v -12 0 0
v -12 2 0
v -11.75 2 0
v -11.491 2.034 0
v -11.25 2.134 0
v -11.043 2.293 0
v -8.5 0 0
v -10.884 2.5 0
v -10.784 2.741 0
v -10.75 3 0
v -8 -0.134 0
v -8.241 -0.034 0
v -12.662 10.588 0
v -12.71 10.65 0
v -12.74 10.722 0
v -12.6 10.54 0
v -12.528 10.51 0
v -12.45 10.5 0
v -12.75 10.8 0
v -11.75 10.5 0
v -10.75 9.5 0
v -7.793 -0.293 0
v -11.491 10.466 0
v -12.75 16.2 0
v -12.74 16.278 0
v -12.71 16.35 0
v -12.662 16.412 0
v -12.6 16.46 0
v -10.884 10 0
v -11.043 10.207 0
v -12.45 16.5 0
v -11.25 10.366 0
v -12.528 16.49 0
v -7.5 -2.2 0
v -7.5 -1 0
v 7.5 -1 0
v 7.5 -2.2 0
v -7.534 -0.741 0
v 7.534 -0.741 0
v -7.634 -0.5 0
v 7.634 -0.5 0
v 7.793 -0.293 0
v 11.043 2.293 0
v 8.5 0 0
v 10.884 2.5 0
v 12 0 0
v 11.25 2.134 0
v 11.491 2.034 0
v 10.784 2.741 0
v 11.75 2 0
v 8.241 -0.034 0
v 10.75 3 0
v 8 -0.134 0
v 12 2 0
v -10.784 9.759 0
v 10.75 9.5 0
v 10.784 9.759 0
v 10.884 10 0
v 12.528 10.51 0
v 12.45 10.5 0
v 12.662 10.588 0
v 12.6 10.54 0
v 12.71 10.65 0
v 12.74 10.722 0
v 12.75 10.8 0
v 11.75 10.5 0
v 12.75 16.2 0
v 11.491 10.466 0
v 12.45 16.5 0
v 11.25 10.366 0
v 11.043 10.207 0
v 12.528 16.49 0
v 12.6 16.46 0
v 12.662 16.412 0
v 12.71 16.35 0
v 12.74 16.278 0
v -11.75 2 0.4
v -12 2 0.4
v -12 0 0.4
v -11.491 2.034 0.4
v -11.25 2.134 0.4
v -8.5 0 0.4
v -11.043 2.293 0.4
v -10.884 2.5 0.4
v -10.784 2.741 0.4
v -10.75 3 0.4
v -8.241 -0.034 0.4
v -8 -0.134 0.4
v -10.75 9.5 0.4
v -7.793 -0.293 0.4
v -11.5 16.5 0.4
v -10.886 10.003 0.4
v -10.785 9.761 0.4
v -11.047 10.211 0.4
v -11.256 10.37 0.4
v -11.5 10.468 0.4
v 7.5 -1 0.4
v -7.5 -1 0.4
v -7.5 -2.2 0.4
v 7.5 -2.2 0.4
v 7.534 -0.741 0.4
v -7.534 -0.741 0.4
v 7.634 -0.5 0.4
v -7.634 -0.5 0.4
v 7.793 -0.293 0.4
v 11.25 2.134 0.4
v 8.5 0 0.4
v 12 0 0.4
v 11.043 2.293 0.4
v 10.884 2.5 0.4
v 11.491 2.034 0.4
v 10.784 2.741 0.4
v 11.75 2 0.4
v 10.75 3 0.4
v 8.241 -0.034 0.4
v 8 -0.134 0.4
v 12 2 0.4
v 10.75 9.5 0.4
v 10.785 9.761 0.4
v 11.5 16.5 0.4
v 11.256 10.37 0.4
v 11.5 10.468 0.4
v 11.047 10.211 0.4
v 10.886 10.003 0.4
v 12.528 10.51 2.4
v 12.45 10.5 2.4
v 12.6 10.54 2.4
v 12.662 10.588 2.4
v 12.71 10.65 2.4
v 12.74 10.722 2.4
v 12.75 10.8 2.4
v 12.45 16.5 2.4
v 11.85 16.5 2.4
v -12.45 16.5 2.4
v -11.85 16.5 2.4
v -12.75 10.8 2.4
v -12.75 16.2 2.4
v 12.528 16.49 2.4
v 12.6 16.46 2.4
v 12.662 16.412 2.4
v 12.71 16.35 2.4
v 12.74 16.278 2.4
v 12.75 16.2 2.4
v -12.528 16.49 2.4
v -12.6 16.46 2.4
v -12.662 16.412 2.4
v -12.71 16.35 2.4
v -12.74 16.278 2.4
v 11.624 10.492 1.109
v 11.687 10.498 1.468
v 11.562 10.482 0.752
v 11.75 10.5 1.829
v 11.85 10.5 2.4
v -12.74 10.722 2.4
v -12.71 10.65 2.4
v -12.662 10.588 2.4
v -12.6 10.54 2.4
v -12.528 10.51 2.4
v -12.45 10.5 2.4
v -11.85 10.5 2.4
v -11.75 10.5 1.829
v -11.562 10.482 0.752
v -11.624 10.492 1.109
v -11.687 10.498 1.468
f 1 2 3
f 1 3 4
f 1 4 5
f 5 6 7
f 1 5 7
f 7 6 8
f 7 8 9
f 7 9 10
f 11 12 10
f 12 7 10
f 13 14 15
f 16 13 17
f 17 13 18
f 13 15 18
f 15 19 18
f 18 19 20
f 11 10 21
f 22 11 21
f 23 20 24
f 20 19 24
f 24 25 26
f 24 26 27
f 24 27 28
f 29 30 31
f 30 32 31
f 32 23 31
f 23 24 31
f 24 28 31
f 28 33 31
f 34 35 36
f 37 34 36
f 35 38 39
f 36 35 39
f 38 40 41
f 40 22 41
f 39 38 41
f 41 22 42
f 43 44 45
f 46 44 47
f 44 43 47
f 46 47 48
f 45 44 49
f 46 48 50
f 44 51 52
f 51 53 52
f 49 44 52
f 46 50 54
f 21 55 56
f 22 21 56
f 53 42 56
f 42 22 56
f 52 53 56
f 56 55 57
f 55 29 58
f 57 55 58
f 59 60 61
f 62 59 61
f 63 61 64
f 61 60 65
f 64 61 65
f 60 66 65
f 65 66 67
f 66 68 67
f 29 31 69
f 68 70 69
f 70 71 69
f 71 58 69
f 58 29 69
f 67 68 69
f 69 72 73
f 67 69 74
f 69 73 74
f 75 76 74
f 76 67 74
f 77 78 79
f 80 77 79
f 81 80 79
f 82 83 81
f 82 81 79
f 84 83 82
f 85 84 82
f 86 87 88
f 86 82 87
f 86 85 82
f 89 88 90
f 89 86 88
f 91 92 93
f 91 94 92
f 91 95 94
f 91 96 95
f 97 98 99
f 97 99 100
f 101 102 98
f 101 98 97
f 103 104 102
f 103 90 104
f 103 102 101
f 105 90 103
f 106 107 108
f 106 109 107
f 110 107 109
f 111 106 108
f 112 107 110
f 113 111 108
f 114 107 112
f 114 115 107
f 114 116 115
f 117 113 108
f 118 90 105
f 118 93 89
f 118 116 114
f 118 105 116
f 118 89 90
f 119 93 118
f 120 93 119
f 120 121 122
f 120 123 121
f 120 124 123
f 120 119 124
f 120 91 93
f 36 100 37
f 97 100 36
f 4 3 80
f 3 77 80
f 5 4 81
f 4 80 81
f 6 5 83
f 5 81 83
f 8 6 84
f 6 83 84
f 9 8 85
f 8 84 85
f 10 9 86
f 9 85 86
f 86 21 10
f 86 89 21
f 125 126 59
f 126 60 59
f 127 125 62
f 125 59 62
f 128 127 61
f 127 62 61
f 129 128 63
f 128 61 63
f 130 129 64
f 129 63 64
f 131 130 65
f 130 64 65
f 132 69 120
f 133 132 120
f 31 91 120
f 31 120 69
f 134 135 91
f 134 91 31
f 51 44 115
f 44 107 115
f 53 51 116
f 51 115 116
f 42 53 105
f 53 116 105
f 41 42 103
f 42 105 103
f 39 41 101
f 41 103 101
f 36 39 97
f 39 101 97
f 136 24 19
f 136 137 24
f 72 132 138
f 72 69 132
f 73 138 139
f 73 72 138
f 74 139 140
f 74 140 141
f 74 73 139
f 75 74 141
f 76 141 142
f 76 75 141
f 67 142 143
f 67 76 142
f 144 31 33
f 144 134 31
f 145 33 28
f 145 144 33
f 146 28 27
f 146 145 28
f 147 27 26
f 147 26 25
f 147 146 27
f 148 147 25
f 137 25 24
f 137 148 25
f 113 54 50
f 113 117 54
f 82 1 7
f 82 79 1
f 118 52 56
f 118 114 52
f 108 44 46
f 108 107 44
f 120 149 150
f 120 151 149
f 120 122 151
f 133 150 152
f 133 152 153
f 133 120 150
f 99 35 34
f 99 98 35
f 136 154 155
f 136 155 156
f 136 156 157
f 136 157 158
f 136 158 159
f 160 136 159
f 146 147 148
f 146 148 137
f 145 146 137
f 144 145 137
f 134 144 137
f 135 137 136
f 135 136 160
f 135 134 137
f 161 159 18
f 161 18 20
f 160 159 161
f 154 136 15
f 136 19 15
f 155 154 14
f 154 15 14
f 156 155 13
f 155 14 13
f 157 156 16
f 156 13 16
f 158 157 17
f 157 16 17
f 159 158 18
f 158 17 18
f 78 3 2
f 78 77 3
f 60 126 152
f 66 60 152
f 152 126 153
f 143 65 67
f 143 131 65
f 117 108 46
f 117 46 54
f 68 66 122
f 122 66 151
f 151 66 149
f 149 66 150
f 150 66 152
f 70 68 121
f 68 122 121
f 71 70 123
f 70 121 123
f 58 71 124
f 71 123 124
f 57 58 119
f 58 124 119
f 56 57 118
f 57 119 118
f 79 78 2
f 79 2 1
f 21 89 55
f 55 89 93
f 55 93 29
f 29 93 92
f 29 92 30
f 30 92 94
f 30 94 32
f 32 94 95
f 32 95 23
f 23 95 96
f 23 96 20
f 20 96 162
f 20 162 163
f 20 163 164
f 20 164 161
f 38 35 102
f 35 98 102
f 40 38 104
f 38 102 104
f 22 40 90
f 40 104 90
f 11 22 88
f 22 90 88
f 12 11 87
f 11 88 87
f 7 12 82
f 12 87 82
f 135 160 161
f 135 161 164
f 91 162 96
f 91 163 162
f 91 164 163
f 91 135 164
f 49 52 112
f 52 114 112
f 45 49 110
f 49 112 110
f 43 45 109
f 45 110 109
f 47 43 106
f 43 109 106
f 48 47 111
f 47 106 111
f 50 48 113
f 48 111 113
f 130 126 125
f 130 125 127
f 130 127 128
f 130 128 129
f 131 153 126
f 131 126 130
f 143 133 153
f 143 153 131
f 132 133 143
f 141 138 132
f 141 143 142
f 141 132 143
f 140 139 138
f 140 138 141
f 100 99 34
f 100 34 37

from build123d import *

# Parameters (mm, degrees)
F0_W     = 15
F0_H     = 1
F0_H_2   = 1.2
F0_W_2   = 1.1
F0_H_3   = 6
F0_W_3   = 0.9
F5_DEPTH = 6
F6_R     = 1
F7_R     = 0.3


with BuildPart() as f2:
    # F2: sweep along a path in F1
    with BuildLine(Plane.XZ) as f2_path:
        Line((0, 0), (0, 0.4))
    # F0 (on Top) → F2 (sweep)
    with BuildSketch(Plane.XY):
        Polygon((-10.75, 1), (-10.75, 0), (-7.5, 0), (7.5, 0), (10.75, 0), (10.75, 1), align=None)
        Polygon((-12, 0), (-10.75, 0), (-10.75, 1), (-10.75, 2), (-12, 2), align=None)
        with Locations((0, -0.5)):
            Rectangle(F0_W, F0_H)
        Polygon((-10.75, 2), (-10.75, 1), (10.75, 1), (10.75, 2), (10.75, 10.5), (10.75, 16.5), (-10.75, 16.5), (-10.75, 10.5), align=None)
        with Locations((0, -1.6)):
            Rectangle(F0_W, F0_H_2)
        Polygon((10.75, 2), (10.75, 1), (10.75, 0), (12, 0), (12, 2), align=None)
        with Locations((-11.3, 13.5)):
            Rectangle(F0_W_2, F0_H_3)
        with Locations((-12.3, 13.5)):
            Rectangle(F0_W_3, F0_H_3)
        with Locations((11.3, 13.5)):
            Rectangle(F0_W_2, F0_H_3)
        with Locations((12.3, 13.5)):
            Rectangle(F0_W_3, F0_H_3)
    sweep(path=f2_path.line)

    # F3: sweep along a path in F1
    with BuildLine(Plane.XZ) as f3_path:
        Line((0, 0), (0, 0.4))
        Line((0, 0.4), (0, 2.4))
    # F0 (on Top) → F3 (sweep)
    with BuildSketch(Plane.XY):
        with Locations((12.3, 13.5)):
            Rectangle(F0_W_3, F0_H_3)
        with Locations((-12.3, 13.5)):
            Rectangle(F0_W_3, F0_H_3)
    sweep(path=f3_path.line)

    # F4 (on face) → F5 (join, through all)
    with BuildSketch(Plane(origin=(0, 16.5, 0), x_dir=(-1, 0, 0), z_dir=(0, 1, 0))):
        Polygon((-11.5, 0.4), (-11.85, 2.4), (-11.85, 0.4), align=None)
        Polygon((11.85, 2.4), (11.5, 0.4), (11.85, 0.4), align=None)
    extrude(amount=-F5_DEPTH)

    # F6
    f6_edges = [f2.edges().sort_by_distance(p)[0] for p in [
        (7.5, 0, 0.2),
        (-7.5, 0, 0.2),
        (-10.75, 2, 0.2),
        (-10.75, 10.5, 0.2),
        (10.75, 10.5, 0.2),
        (10.75, 2, 0.2),
    ]]
    fillet(f6_edges, radius=F6_R)

    # F7
    f7_edges = [f2.edges().sort_by_distance(p)[0] for p in [
        (-12.75, 16.5, 1.2),
        (12.75, 16.5, 1.2),
        (12.75, 10.5, 1.2),
        (-12.75, 10.5, 1.2),
    ]]
    fillet(f7_edges, radius=F7_R)


solid = f2.part
